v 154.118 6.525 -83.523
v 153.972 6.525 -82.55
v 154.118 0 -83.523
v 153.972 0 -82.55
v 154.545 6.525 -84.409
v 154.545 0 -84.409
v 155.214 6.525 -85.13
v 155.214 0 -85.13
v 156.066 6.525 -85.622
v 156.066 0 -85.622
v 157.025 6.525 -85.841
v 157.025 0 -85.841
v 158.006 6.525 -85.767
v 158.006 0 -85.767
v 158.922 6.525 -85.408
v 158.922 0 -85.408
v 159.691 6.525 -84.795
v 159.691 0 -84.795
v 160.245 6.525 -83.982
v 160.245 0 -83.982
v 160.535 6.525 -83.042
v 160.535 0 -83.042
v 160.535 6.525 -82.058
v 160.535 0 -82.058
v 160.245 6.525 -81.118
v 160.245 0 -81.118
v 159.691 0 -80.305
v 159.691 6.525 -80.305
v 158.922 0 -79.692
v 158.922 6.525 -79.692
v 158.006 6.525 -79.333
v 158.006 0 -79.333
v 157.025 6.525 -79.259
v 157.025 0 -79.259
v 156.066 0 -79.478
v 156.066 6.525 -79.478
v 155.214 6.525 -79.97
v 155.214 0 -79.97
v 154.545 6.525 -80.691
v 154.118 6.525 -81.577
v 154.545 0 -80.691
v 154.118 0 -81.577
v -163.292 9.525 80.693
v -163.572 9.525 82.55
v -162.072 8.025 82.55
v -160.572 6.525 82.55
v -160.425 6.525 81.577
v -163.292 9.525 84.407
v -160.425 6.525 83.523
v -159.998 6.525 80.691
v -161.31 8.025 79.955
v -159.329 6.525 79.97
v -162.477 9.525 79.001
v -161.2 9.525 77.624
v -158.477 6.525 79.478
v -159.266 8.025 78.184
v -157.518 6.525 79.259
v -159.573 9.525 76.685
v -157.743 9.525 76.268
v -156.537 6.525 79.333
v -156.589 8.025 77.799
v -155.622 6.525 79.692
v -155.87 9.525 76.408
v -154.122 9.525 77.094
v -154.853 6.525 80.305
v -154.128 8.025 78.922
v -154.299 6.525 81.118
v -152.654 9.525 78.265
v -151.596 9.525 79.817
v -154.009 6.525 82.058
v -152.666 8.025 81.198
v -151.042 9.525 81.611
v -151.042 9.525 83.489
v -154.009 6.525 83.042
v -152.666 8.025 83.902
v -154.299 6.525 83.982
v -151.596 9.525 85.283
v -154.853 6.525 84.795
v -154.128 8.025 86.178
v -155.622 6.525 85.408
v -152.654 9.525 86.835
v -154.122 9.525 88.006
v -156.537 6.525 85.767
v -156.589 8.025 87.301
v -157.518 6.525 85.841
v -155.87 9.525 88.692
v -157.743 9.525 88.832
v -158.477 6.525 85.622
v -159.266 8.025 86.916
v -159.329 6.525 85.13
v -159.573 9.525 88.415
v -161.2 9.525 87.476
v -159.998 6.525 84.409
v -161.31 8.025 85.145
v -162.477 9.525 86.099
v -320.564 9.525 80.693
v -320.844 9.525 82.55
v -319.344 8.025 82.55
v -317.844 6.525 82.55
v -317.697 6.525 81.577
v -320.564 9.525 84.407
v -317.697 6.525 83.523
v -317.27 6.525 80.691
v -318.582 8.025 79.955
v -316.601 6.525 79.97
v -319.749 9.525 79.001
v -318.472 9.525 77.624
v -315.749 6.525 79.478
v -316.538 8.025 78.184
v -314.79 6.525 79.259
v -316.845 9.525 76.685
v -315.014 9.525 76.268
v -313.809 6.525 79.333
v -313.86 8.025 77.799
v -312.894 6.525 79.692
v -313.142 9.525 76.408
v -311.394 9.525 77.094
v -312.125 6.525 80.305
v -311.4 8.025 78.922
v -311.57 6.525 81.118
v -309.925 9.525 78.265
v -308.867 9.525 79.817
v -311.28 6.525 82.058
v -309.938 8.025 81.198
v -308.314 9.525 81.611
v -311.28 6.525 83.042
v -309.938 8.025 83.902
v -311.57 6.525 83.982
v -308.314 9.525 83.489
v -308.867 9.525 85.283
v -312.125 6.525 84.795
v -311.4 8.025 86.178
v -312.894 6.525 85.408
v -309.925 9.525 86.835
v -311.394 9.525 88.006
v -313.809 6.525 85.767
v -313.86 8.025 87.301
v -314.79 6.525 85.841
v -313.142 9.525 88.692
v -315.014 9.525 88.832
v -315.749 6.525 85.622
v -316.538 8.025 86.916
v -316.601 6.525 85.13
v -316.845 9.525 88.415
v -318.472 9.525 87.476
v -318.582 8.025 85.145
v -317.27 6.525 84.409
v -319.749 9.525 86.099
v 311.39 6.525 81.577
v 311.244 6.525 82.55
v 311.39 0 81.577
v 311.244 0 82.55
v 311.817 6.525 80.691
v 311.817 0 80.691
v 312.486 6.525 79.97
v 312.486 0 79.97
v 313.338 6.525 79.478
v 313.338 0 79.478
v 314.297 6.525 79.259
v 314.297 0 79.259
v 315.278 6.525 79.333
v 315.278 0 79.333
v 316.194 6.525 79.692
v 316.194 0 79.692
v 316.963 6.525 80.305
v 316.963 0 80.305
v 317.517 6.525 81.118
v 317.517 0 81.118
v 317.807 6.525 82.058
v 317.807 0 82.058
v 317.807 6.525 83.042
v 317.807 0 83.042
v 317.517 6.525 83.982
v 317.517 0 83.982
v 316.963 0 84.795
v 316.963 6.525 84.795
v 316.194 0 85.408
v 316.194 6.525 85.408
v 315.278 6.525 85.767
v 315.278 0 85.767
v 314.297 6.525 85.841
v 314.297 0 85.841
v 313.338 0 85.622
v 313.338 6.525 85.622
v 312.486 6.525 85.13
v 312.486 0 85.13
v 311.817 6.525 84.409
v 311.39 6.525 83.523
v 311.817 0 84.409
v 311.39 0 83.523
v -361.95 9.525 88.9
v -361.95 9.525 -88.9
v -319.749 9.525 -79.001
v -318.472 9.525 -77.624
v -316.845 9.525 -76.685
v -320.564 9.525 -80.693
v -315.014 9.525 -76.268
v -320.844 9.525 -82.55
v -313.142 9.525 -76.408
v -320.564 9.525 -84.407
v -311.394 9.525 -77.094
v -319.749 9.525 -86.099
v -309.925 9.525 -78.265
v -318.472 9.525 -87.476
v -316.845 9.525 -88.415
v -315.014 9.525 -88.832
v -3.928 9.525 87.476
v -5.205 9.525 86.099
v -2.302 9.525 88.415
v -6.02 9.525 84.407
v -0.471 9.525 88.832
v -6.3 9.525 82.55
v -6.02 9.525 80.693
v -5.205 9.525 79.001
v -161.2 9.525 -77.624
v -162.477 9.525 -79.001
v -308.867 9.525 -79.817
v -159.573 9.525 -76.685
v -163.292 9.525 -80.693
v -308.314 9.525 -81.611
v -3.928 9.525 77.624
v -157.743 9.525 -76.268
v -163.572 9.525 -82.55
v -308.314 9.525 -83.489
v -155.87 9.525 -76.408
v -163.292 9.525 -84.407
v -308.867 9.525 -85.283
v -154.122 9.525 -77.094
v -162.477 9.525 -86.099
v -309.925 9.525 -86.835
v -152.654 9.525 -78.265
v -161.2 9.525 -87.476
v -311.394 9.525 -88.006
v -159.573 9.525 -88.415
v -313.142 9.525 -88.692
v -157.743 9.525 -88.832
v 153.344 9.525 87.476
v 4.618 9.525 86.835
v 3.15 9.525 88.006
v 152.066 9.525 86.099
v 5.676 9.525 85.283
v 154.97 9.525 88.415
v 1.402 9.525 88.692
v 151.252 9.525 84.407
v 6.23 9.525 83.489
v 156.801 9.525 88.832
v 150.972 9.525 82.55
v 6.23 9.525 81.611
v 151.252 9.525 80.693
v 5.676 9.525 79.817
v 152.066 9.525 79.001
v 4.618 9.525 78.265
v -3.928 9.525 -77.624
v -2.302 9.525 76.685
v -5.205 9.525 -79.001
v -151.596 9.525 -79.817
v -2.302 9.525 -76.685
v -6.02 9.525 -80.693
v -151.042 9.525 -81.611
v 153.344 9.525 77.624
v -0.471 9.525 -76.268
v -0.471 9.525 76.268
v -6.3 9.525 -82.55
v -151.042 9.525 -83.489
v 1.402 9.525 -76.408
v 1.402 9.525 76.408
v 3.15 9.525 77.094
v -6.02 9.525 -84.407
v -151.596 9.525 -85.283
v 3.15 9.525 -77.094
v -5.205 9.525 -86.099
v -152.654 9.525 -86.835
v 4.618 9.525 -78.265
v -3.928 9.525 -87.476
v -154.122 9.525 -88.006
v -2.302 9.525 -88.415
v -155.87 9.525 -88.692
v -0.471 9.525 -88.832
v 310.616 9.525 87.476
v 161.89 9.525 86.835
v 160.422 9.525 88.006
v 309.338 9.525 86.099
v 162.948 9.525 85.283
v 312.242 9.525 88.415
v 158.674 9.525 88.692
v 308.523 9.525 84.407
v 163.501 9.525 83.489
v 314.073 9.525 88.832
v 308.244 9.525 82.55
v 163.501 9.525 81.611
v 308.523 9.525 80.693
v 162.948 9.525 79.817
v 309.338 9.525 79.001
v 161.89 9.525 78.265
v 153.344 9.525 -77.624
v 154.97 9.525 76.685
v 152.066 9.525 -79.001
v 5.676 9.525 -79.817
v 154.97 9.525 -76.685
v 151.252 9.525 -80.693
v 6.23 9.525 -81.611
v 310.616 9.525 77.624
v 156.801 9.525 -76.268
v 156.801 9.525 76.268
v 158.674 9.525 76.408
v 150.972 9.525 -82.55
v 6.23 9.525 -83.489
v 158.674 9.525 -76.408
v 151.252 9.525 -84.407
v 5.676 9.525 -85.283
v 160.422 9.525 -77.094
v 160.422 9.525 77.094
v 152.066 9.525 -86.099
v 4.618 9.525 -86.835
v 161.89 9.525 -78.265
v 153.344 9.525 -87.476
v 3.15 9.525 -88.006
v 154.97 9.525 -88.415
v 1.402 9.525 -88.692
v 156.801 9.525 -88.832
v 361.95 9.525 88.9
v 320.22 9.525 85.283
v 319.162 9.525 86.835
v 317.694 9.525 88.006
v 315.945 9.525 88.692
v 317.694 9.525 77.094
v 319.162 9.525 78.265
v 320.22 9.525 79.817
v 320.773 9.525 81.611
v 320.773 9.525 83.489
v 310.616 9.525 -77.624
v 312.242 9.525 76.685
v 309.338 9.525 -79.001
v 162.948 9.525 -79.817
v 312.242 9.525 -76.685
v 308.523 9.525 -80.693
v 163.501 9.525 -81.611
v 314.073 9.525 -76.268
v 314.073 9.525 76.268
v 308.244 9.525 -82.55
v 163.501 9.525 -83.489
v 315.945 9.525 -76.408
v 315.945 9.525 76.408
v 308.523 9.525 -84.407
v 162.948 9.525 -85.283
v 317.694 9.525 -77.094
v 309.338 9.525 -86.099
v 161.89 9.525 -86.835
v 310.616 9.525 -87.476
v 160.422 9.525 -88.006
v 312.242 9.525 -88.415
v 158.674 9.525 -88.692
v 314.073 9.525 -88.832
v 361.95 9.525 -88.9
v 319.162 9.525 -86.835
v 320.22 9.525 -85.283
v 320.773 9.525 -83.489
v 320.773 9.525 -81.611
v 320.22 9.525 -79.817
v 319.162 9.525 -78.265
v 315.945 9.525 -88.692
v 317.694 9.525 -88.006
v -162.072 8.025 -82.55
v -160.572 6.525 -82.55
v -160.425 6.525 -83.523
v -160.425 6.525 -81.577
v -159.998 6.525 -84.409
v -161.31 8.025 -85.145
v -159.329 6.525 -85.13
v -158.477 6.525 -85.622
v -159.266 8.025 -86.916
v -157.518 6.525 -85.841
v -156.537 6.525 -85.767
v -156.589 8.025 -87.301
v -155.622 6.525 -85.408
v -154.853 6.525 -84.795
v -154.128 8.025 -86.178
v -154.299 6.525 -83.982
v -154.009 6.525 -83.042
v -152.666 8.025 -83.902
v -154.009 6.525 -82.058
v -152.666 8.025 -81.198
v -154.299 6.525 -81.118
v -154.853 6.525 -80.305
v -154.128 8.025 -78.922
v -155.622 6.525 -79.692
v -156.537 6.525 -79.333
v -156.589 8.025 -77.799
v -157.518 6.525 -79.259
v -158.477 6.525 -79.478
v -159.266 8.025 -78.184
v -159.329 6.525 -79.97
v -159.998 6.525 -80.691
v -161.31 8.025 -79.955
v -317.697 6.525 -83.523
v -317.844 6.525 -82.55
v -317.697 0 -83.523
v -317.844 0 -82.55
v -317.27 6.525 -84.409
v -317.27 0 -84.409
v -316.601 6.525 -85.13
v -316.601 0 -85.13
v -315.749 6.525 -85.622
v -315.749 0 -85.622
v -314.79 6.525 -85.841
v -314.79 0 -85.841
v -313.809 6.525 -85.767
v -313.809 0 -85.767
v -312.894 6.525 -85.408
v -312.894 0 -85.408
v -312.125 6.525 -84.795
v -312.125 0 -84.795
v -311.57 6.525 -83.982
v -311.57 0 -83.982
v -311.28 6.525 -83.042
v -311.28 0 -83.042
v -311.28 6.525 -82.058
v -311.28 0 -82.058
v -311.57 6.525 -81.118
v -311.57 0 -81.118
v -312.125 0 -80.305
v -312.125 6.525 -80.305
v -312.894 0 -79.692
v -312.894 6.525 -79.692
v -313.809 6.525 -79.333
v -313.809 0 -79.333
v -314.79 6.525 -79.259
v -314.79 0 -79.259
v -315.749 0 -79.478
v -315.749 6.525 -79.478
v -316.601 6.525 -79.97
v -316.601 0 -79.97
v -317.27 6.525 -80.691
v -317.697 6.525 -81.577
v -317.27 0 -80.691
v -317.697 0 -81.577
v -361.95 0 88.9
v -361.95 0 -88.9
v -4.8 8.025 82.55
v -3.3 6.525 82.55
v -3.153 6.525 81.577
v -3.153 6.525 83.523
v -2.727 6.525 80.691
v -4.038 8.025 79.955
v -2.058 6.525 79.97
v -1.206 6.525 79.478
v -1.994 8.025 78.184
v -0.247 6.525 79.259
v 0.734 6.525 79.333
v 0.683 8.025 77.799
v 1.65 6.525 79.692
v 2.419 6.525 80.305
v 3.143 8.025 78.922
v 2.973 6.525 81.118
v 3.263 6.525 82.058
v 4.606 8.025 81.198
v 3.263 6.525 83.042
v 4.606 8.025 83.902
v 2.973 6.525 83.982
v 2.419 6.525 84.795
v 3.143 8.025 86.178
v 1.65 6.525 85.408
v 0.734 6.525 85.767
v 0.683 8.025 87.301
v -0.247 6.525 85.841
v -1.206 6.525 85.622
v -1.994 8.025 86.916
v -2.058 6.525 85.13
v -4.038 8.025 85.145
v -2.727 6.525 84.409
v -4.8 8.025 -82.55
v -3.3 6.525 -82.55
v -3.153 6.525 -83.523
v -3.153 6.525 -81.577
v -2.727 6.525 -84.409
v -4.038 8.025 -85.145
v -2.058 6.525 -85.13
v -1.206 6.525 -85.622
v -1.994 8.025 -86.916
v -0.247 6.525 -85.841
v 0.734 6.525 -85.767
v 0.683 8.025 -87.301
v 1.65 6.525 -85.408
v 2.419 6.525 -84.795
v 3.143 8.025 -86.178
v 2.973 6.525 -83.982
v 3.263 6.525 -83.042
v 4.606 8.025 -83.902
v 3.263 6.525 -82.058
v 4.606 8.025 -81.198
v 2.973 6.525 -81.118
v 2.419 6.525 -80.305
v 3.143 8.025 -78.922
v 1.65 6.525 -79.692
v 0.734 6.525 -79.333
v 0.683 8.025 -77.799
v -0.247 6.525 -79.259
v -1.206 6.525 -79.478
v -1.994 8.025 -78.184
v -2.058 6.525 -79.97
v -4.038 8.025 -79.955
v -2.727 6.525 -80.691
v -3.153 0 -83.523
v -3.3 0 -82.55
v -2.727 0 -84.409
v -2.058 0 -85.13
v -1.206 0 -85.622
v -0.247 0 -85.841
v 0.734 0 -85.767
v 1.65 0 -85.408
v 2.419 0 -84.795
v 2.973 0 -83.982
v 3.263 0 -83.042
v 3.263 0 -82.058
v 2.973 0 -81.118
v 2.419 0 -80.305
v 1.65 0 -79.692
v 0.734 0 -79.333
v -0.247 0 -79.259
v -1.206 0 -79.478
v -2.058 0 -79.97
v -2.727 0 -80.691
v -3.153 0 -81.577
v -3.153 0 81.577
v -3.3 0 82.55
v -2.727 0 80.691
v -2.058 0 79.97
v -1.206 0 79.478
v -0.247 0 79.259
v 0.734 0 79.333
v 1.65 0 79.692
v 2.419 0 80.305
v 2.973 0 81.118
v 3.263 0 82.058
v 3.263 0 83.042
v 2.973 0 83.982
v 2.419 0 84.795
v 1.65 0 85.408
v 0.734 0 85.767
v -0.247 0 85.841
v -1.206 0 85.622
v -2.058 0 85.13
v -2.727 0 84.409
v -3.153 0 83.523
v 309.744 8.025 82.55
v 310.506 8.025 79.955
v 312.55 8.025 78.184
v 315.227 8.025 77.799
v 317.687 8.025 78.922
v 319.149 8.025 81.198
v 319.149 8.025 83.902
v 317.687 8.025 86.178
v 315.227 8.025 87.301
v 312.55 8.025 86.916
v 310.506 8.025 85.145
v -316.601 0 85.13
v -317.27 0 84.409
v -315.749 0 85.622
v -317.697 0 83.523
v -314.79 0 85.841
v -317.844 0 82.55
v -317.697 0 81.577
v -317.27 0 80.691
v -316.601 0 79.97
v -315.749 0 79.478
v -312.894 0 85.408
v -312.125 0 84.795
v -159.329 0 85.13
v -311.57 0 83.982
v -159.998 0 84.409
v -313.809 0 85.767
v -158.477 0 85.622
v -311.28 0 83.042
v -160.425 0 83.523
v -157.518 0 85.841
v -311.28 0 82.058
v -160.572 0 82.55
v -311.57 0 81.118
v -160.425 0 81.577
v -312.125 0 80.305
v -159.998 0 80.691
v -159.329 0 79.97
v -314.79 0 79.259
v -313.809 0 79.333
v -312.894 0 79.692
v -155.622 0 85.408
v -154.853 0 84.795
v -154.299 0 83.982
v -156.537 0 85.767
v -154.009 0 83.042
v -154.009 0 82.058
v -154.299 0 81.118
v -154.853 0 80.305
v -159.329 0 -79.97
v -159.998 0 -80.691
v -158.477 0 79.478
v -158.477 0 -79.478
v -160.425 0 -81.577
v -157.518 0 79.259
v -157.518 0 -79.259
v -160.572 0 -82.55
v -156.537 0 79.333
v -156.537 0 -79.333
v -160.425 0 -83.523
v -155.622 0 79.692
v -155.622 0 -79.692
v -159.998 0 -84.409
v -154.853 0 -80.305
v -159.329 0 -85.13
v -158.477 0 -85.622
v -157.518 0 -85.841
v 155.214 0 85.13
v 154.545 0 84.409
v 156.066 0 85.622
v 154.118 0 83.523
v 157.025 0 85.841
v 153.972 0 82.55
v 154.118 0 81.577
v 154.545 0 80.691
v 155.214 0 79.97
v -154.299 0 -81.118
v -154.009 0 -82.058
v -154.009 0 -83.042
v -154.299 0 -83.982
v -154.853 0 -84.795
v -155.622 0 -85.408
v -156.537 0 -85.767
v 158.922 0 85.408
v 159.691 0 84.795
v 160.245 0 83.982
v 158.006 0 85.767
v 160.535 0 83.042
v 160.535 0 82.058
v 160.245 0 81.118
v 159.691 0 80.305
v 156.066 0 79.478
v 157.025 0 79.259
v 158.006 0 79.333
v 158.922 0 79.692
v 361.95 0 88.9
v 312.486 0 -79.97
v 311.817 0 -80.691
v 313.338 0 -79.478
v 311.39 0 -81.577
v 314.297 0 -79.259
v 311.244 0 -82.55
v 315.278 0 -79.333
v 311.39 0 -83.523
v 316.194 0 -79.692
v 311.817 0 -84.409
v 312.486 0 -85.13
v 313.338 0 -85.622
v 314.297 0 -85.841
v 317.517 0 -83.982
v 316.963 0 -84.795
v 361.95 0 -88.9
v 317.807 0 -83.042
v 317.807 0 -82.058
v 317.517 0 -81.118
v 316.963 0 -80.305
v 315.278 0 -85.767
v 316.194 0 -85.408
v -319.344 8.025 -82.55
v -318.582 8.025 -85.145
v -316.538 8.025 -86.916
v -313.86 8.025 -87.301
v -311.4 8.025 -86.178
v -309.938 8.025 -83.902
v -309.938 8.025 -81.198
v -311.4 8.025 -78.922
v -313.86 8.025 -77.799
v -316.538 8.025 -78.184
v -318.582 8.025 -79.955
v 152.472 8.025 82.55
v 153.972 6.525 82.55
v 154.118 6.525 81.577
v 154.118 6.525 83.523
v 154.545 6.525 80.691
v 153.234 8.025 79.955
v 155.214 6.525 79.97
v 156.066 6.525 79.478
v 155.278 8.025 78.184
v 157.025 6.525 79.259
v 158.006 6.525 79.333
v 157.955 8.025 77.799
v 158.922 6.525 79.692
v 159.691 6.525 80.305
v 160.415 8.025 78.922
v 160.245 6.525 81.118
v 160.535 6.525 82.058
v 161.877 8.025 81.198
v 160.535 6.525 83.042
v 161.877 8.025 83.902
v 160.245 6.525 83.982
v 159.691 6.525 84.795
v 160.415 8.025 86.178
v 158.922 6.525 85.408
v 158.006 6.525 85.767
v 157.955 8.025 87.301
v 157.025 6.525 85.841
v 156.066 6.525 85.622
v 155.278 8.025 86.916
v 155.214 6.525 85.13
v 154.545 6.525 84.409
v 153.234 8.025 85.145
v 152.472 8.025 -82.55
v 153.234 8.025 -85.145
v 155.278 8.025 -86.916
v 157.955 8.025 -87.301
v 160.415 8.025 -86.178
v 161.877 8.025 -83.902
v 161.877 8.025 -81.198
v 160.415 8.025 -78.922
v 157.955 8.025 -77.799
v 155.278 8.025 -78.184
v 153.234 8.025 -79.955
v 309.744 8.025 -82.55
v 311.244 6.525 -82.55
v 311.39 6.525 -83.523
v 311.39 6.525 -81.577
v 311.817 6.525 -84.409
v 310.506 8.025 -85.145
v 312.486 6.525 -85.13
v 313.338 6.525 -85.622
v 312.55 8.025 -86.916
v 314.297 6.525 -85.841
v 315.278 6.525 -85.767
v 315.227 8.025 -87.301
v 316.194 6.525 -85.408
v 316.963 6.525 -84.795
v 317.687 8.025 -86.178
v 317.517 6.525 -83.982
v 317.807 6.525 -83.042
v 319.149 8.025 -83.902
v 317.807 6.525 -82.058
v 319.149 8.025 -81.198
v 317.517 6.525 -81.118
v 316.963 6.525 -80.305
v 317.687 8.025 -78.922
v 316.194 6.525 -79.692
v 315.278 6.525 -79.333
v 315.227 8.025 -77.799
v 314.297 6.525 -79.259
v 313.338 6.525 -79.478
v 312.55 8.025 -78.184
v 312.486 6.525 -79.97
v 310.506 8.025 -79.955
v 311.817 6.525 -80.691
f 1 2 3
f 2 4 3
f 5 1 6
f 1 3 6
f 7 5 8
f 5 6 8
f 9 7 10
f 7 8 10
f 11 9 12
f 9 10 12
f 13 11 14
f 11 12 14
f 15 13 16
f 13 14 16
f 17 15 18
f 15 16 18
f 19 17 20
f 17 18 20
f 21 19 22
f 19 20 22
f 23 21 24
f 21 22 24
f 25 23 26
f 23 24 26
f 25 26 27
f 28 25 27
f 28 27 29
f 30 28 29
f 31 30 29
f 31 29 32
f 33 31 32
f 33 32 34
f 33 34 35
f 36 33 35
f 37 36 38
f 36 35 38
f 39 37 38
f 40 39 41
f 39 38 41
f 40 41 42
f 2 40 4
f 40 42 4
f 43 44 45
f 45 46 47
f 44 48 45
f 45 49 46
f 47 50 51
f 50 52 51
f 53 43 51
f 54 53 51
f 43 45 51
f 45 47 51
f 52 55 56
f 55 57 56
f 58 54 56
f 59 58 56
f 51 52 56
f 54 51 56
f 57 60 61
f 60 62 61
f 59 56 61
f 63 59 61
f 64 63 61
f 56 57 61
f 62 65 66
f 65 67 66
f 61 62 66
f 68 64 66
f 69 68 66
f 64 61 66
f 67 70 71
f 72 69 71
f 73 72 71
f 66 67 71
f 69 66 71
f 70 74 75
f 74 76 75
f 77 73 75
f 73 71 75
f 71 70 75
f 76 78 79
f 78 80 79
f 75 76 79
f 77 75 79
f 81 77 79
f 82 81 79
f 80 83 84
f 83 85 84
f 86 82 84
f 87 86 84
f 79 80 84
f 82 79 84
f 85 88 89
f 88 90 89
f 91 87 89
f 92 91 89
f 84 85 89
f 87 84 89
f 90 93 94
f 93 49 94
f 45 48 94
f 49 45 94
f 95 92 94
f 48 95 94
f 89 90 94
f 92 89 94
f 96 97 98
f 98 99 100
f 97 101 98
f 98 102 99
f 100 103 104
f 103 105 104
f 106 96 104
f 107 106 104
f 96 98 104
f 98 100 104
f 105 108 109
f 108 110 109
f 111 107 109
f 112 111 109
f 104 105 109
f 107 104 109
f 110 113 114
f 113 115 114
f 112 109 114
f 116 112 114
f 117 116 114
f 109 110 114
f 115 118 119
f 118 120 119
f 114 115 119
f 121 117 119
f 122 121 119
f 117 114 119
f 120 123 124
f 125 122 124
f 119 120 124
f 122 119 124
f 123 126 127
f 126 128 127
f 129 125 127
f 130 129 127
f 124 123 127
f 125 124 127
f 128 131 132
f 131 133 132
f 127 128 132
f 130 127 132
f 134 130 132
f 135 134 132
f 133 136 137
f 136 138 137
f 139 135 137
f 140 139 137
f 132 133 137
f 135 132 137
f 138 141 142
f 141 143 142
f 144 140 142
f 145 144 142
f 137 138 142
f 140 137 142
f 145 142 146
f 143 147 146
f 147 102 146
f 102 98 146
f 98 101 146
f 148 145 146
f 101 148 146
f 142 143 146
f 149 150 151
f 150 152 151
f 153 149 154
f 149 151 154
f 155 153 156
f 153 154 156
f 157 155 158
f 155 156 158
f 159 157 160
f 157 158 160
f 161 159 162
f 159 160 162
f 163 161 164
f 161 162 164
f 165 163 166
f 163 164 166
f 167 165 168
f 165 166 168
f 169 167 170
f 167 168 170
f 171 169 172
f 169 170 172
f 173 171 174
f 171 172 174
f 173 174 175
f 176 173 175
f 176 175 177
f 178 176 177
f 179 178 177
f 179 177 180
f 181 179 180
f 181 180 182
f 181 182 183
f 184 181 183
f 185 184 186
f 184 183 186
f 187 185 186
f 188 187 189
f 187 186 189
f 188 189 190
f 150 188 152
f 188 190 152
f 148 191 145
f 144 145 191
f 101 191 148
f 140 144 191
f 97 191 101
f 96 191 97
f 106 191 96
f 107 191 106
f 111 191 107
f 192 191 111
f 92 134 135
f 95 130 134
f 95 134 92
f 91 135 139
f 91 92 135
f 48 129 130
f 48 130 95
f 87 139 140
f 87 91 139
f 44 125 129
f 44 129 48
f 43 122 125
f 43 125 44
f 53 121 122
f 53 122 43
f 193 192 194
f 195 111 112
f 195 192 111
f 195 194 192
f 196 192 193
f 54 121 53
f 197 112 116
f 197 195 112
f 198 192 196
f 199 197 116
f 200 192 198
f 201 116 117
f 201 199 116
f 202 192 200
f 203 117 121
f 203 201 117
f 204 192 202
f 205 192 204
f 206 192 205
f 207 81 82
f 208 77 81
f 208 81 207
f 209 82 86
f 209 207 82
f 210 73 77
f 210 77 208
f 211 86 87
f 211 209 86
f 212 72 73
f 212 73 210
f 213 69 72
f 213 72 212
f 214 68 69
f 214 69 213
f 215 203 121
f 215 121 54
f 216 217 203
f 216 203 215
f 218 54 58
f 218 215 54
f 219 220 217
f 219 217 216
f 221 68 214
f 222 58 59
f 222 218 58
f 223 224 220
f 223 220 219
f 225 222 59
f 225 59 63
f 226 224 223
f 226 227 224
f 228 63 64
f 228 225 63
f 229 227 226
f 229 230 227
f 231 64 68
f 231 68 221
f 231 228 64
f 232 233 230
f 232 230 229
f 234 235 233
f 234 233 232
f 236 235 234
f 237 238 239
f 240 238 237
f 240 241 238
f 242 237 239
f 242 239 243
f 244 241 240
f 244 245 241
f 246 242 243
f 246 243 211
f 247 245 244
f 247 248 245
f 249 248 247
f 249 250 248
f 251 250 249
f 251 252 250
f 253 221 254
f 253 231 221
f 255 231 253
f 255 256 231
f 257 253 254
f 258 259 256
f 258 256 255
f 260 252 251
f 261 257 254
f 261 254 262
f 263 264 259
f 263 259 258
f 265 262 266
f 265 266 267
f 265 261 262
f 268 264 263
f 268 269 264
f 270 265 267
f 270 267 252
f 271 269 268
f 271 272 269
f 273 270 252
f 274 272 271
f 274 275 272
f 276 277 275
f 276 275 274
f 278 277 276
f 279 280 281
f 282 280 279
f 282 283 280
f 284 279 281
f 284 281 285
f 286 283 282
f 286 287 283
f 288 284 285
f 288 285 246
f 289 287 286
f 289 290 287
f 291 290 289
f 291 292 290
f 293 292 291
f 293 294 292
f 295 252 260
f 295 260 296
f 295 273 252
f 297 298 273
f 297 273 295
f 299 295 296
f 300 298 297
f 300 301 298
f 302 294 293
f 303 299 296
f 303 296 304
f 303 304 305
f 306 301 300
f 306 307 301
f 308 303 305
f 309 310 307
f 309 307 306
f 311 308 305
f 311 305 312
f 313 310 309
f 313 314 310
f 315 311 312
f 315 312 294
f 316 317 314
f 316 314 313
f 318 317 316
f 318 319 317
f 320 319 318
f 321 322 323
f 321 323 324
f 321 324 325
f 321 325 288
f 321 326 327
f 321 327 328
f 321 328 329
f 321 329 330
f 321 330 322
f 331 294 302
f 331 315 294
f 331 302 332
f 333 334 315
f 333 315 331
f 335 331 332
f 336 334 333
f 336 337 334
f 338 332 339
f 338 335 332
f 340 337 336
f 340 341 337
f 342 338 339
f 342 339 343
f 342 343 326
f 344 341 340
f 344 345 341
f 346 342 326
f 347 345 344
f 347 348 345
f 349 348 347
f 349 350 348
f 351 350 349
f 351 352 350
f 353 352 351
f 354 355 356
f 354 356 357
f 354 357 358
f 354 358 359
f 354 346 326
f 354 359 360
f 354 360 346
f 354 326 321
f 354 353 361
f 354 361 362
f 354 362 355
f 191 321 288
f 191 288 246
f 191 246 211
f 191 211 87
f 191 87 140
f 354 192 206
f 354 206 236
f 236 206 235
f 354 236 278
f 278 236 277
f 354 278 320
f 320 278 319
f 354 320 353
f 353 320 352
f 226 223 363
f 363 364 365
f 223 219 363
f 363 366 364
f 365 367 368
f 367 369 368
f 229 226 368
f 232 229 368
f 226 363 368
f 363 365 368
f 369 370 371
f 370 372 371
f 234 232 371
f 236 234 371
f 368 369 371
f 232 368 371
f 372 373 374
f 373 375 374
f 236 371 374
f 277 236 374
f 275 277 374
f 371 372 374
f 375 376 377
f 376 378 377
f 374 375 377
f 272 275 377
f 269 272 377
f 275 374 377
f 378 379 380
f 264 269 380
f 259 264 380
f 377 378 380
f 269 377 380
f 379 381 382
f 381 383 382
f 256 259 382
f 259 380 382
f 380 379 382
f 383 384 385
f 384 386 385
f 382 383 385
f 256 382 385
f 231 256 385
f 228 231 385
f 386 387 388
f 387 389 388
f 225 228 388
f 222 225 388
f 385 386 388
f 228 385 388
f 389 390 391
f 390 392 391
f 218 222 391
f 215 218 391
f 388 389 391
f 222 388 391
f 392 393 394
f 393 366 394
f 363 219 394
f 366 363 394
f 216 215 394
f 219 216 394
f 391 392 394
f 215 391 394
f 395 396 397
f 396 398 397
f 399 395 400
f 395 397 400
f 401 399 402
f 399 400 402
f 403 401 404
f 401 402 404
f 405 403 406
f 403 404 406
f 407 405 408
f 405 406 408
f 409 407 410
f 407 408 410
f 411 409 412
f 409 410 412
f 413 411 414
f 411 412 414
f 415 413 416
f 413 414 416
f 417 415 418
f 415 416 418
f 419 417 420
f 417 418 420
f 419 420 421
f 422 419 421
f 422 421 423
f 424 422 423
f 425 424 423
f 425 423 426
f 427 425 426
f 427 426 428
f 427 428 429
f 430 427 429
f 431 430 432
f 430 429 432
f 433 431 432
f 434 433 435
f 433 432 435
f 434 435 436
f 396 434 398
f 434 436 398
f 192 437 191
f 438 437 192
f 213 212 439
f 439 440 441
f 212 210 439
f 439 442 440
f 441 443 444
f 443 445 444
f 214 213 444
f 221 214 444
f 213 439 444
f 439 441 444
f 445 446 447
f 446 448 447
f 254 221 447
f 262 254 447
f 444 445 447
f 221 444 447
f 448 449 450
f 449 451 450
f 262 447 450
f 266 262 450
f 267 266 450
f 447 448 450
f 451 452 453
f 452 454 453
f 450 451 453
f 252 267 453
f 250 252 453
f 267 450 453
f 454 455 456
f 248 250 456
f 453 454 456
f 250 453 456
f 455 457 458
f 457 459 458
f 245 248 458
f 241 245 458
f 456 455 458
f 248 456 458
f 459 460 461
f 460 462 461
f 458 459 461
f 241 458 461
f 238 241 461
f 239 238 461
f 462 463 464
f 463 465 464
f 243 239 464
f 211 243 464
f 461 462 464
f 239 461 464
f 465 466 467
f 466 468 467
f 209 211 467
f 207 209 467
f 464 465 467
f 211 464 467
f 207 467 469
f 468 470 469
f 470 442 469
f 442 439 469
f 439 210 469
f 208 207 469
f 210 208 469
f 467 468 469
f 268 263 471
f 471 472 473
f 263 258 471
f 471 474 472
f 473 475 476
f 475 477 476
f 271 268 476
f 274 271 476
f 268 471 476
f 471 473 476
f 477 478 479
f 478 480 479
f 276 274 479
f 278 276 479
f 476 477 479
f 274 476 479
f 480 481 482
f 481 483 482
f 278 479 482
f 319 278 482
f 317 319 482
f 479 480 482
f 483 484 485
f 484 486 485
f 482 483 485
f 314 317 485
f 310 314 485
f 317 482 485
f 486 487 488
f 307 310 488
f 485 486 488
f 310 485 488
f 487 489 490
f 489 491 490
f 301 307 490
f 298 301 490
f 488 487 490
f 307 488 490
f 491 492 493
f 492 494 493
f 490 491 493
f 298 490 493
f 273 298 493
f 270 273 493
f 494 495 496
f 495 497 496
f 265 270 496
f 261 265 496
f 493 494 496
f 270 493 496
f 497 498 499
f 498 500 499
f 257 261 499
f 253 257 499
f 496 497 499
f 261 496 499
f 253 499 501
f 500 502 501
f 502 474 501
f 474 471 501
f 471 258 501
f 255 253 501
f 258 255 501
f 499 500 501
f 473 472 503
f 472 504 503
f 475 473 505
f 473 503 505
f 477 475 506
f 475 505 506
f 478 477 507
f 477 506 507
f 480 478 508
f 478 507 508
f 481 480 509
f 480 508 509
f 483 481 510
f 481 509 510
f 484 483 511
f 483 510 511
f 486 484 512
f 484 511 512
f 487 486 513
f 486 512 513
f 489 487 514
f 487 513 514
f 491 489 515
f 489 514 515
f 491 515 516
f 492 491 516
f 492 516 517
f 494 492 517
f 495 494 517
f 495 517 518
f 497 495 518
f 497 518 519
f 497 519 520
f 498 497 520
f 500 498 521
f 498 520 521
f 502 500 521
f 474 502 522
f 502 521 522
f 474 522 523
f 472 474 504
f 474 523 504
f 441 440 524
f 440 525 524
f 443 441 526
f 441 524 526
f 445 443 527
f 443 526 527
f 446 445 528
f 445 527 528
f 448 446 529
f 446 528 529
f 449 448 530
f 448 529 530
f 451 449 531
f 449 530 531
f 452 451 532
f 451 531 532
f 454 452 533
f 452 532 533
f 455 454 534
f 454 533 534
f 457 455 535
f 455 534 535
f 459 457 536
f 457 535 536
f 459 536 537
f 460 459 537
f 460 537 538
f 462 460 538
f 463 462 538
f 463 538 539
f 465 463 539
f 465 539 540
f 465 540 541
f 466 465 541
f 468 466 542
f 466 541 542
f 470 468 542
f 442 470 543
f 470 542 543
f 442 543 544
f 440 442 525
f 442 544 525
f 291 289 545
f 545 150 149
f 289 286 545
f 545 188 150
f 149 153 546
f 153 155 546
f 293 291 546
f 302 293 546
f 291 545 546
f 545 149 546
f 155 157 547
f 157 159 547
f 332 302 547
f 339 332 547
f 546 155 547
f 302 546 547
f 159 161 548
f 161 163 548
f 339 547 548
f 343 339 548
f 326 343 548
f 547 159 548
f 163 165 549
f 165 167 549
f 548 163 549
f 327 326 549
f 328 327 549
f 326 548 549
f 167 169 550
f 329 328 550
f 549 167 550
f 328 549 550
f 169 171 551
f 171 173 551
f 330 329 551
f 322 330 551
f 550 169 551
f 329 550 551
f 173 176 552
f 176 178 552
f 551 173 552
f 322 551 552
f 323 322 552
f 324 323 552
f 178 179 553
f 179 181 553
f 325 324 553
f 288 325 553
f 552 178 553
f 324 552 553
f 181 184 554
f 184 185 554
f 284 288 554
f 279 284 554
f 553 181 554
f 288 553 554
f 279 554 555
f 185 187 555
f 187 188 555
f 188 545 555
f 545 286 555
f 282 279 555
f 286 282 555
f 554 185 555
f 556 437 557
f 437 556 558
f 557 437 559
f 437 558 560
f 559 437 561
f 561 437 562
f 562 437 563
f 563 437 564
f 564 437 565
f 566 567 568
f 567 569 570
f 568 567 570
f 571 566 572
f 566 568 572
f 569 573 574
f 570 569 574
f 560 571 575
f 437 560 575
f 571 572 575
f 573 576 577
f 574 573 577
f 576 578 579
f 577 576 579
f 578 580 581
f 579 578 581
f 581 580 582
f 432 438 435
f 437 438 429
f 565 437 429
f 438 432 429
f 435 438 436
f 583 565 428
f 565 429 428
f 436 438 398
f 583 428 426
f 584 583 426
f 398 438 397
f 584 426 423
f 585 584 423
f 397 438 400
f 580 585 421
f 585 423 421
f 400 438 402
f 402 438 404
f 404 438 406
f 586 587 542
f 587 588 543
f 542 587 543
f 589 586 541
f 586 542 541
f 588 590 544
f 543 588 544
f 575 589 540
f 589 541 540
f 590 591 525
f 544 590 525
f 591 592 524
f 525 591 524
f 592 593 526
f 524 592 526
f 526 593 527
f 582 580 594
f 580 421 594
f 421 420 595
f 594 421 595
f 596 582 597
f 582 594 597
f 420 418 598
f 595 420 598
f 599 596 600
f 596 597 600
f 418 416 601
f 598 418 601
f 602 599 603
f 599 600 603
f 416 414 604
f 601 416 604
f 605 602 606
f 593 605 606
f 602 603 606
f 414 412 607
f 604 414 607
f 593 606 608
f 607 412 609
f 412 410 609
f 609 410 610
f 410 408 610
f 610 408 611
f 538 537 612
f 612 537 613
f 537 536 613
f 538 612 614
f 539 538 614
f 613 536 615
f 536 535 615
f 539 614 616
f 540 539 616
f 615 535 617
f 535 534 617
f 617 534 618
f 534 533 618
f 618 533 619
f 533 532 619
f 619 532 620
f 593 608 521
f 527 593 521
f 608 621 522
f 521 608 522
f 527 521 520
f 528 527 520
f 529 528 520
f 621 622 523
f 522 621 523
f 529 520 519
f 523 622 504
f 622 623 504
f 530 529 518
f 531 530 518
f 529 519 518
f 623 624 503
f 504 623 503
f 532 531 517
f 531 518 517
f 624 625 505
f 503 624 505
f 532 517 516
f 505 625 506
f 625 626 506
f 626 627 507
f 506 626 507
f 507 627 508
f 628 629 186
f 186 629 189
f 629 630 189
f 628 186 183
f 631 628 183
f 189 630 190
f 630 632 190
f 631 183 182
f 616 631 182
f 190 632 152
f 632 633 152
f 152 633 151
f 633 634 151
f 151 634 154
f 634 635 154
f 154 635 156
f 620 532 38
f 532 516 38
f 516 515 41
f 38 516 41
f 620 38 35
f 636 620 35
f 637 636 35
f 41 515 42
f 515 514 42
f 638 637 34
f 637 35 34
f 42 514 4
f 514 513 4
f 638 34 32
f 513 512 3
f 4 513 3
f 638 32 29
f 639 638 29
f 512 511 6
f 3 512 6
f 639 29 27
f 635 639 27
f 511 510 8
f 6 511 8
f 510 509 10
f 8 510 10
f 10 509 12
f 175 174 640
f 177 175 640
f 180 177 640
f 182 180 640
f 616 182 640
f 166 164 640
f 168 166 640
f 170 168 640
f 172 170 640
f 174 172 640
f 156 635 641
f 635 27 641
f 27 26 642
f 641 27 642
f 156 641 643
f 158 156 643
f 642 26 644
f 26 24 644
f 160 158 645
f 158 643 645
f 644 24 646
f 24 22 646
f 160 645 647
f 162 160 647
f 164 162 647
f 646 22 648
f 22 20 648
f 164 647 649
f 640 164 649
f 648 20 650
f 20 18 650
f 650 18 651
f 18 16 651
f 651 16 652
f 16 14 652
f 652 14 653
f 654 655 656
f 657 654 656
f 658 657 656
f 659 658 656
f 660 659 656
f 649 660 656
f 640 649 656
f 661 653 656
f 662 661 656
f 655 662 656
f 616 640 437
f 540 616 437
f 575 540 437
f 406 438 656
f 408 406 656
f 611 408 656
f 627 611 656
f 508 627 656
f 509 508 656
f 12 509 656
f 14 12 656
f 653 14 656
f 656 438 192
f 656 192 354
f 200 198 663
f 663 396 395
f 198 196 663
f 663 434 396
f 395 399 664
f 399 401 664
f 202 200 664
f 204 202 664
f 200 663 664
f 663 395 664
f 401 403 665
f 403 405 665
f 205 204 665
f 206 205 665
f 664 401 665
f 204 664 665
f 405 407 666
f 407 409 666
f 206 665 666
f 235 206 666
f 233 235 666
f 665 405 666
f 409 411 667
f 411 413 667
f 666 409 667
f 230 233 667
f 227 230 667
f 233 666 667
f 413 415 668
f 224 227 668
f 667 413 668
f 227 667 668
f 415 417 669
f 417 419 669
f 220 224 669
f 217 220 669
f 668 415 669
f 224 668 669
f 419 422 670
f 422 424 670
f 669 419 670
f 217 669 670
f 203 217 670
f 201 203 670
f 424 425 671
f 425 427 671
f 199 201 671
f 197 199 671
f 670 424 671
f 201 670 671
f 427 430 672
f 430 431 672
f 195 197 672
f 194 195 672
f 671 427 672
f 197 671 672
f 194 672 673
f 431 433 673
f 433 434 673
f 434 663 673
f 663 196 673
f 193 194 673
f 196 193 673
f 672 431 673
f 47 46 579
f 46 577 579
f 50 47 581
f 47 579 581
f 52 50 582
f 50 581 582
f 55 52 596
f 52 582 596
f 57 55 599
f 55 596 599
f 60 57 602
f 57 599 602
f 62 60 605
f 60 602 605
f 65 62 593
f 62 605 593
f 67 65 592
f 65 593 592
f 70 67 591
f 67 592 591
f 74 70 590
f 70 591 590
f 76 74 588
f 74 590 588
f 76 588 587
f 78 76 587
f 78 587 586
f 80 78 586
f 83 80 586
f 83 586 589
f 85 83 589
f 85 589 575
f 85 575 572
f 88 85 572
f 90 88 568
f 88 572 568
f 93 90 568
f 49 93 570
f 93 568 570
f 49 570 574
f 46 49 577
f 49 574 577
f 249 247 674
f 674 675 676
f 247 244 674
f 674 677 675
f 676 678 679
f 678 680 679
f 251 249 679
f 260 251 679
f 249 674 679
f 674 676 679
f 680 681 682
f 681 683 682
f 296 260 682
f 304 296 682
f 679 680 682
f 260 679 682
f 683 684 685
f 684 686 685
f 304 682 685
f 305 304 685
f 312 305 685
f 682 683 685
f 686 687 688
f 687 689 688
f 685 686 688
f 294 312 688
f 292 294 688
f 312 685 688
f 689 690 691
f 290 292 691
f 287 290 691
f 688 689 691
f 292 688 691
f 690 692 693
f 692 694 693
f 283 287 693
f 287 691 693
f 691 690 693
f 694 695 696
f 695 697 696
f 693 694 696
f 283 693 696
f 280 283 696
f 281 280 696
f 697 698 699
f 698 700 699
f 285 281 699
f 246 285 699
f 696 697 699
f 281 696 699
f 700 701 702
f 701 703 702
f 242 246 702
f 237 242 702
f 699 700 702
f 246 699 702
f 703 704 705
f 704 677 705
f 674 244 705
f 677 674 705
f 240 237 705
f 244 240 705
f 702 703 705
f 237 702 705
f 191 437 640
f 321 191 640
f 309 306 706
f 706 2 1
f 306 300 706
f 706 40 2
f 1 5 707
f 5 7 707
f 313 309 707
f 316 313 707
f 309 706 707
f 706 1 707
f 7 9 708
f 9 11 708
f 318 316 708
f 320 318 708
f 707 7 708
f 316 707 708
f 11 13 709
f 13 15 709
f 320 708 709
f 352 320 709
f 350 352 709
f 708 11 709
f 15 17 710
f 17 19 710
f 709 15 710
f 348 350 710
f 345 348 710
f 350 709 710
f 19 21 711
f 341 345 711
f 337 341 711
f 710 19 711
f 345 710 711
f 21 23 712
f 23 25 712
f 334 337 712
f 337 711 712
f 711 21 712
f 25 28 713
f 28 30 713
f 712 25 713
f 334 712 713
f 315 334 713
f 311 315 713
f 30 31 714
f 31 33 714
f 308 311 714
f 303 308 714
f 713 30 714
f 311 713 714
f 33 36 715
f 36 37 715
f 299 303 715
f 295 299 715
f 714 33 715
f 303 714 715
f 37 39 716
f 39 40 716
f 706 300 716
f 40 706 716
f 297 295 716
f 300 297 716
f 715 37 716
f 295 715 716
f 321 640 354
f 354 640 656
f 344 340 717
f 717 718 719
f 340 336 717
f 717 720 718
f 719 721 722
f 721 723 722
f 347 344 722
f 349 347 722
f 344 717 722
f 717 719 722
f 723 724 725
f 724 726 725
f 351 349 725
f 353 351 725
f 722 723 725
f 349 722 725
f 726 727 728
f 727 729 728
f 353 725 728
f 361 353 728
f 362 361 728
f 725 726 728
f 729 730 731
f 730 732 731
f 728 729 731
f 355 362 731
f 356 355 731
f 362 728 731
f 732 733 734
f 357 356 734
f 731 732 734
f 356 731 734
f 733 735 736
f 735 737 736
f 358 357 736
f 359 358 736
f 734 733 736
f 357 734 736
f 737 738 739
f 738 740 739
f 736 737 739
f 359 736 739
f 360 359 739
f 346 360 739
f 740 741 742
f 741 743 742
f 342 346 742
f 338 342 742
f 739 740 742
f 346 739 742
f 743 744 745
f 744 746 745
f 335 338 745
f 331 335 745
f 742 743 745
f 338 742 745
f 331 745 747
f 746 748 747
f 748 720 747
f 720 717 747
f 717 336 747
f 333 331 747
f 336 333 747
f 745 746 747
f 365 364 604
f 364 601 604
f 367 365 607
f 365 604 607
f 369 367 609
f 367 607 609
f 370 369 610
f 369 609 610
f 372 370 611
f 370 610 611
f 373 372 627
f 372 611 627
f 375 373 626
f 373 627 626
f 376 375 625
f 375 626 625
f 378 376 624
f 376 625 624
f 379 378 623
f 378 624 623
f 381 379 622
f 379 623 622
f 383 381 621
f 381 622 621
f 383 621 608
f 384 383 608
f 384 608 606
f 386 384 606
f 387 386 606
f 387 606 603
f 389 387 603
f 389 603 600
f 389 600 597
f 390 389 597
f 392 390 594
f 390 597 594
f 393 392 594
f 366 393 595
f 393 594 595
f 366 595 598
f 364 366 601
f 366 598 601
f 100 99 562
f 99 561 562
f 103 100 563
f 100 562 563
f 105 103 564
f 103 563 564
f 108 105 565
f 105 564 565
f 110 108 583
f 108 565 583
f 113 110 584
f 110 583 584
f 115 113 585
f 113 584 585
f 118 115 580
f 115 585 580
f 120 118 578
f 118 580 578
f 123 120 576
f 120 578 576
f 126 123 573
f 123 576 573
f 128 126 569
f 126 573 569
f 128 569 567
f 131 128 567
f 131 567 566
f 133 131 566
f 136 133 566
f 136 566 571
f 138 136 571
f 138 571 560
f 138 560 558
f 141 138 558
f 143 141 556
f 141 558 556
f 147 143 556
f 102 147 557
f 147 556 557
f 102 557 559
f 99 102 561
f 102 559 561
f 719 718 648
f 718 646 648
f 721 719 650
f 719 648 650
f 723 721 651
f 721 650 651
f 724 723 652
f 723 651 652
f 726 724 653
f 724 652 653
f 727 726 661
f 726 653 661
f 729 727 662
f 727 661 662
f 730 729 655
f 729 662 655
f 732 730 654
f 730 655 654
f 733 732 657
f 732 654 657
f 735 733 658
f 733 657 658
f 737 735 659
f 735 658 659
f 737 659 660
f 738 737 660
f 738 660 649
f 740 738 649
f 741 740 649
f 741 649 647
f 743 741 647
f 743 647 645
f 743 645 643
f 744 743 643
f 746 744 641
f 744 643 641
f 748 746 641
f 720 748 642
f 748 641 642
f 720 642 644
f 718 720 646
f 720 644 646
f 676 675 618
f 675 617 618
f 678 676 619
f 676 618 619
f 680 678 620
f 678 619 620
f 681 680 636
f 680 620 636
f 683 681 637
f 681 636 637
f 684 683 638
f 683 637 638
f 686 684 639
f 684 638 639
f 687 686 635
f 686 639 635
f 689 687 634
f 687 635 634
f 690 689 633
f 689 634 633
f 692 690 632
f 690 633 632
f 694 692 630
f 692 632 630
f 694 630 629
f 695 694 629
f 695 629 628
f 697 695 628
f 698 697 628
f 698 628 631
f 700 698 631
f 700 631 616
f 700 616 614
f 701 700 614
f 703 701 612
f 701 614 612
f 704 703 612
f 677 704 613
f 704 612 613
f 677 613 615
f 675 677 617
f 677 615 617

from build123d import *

# Parameters (mm, degrees)
SKETCH1_W                                       = 723.9
SKETCH1_H                                       = 177.8
BOSS_EXTRUDE1_DEPTH                             = 9.525
CSK_FOR_M6_FLAT_HEAD_MACHINE_SCREW1_D           = 6.6
CSK_FOR_M6_FLAT_HEAD_MACHINE_SCREW1_CSINK_D     = 12.6
CSK_FOR_M6_FLAT_HEAD_MACHINE_SCREW1_CSINK_ANGLE = 90


with BuildPart() as part:
    # Sketch1 → Boss-Extrude1 (new body)
    with BuildSketch(Plane(origin=(0, 0, 0), x_dir=(1, 0, 0), z_dir=(0, 1, 0))):
        Rectangle(SKETCH1_W, SKETCH1_H)
    extrude(amount=BOSS_EXTRUDE1_DEPTH)

    # CSK for M6 Flat Head Machine Screw1 (through all)
    with Locations(Plane(origin=(0, 9.525, 0), x_dir=(1, 0, 0), z_dir=(0, 1, 0))):
        with Locations((314.5436, 82.55), (-157.2718, 82.55), (157.2718, 82.55), (-157.2718, -82.55), (157.2718, -82.55), (314.5436, -82.55), (-314.5436, 82.55), (-314.5436, -82.55), (0, -82.55), (0, 82.55)):
            CounterSinkHole(CSK_FOR_M6_FLAT_HEAD_MACHINE_SCREW1_D / 2, CSK_FOR_M6_FLAT_HEAD_MACHINE_SCREW1_CSINK_D / 2, counter_sink_angle=CSK_FOR_M6_FLAT_HEAD_MACHINE_SCREW1_CSINK_ANGLE)


solid = part.part
